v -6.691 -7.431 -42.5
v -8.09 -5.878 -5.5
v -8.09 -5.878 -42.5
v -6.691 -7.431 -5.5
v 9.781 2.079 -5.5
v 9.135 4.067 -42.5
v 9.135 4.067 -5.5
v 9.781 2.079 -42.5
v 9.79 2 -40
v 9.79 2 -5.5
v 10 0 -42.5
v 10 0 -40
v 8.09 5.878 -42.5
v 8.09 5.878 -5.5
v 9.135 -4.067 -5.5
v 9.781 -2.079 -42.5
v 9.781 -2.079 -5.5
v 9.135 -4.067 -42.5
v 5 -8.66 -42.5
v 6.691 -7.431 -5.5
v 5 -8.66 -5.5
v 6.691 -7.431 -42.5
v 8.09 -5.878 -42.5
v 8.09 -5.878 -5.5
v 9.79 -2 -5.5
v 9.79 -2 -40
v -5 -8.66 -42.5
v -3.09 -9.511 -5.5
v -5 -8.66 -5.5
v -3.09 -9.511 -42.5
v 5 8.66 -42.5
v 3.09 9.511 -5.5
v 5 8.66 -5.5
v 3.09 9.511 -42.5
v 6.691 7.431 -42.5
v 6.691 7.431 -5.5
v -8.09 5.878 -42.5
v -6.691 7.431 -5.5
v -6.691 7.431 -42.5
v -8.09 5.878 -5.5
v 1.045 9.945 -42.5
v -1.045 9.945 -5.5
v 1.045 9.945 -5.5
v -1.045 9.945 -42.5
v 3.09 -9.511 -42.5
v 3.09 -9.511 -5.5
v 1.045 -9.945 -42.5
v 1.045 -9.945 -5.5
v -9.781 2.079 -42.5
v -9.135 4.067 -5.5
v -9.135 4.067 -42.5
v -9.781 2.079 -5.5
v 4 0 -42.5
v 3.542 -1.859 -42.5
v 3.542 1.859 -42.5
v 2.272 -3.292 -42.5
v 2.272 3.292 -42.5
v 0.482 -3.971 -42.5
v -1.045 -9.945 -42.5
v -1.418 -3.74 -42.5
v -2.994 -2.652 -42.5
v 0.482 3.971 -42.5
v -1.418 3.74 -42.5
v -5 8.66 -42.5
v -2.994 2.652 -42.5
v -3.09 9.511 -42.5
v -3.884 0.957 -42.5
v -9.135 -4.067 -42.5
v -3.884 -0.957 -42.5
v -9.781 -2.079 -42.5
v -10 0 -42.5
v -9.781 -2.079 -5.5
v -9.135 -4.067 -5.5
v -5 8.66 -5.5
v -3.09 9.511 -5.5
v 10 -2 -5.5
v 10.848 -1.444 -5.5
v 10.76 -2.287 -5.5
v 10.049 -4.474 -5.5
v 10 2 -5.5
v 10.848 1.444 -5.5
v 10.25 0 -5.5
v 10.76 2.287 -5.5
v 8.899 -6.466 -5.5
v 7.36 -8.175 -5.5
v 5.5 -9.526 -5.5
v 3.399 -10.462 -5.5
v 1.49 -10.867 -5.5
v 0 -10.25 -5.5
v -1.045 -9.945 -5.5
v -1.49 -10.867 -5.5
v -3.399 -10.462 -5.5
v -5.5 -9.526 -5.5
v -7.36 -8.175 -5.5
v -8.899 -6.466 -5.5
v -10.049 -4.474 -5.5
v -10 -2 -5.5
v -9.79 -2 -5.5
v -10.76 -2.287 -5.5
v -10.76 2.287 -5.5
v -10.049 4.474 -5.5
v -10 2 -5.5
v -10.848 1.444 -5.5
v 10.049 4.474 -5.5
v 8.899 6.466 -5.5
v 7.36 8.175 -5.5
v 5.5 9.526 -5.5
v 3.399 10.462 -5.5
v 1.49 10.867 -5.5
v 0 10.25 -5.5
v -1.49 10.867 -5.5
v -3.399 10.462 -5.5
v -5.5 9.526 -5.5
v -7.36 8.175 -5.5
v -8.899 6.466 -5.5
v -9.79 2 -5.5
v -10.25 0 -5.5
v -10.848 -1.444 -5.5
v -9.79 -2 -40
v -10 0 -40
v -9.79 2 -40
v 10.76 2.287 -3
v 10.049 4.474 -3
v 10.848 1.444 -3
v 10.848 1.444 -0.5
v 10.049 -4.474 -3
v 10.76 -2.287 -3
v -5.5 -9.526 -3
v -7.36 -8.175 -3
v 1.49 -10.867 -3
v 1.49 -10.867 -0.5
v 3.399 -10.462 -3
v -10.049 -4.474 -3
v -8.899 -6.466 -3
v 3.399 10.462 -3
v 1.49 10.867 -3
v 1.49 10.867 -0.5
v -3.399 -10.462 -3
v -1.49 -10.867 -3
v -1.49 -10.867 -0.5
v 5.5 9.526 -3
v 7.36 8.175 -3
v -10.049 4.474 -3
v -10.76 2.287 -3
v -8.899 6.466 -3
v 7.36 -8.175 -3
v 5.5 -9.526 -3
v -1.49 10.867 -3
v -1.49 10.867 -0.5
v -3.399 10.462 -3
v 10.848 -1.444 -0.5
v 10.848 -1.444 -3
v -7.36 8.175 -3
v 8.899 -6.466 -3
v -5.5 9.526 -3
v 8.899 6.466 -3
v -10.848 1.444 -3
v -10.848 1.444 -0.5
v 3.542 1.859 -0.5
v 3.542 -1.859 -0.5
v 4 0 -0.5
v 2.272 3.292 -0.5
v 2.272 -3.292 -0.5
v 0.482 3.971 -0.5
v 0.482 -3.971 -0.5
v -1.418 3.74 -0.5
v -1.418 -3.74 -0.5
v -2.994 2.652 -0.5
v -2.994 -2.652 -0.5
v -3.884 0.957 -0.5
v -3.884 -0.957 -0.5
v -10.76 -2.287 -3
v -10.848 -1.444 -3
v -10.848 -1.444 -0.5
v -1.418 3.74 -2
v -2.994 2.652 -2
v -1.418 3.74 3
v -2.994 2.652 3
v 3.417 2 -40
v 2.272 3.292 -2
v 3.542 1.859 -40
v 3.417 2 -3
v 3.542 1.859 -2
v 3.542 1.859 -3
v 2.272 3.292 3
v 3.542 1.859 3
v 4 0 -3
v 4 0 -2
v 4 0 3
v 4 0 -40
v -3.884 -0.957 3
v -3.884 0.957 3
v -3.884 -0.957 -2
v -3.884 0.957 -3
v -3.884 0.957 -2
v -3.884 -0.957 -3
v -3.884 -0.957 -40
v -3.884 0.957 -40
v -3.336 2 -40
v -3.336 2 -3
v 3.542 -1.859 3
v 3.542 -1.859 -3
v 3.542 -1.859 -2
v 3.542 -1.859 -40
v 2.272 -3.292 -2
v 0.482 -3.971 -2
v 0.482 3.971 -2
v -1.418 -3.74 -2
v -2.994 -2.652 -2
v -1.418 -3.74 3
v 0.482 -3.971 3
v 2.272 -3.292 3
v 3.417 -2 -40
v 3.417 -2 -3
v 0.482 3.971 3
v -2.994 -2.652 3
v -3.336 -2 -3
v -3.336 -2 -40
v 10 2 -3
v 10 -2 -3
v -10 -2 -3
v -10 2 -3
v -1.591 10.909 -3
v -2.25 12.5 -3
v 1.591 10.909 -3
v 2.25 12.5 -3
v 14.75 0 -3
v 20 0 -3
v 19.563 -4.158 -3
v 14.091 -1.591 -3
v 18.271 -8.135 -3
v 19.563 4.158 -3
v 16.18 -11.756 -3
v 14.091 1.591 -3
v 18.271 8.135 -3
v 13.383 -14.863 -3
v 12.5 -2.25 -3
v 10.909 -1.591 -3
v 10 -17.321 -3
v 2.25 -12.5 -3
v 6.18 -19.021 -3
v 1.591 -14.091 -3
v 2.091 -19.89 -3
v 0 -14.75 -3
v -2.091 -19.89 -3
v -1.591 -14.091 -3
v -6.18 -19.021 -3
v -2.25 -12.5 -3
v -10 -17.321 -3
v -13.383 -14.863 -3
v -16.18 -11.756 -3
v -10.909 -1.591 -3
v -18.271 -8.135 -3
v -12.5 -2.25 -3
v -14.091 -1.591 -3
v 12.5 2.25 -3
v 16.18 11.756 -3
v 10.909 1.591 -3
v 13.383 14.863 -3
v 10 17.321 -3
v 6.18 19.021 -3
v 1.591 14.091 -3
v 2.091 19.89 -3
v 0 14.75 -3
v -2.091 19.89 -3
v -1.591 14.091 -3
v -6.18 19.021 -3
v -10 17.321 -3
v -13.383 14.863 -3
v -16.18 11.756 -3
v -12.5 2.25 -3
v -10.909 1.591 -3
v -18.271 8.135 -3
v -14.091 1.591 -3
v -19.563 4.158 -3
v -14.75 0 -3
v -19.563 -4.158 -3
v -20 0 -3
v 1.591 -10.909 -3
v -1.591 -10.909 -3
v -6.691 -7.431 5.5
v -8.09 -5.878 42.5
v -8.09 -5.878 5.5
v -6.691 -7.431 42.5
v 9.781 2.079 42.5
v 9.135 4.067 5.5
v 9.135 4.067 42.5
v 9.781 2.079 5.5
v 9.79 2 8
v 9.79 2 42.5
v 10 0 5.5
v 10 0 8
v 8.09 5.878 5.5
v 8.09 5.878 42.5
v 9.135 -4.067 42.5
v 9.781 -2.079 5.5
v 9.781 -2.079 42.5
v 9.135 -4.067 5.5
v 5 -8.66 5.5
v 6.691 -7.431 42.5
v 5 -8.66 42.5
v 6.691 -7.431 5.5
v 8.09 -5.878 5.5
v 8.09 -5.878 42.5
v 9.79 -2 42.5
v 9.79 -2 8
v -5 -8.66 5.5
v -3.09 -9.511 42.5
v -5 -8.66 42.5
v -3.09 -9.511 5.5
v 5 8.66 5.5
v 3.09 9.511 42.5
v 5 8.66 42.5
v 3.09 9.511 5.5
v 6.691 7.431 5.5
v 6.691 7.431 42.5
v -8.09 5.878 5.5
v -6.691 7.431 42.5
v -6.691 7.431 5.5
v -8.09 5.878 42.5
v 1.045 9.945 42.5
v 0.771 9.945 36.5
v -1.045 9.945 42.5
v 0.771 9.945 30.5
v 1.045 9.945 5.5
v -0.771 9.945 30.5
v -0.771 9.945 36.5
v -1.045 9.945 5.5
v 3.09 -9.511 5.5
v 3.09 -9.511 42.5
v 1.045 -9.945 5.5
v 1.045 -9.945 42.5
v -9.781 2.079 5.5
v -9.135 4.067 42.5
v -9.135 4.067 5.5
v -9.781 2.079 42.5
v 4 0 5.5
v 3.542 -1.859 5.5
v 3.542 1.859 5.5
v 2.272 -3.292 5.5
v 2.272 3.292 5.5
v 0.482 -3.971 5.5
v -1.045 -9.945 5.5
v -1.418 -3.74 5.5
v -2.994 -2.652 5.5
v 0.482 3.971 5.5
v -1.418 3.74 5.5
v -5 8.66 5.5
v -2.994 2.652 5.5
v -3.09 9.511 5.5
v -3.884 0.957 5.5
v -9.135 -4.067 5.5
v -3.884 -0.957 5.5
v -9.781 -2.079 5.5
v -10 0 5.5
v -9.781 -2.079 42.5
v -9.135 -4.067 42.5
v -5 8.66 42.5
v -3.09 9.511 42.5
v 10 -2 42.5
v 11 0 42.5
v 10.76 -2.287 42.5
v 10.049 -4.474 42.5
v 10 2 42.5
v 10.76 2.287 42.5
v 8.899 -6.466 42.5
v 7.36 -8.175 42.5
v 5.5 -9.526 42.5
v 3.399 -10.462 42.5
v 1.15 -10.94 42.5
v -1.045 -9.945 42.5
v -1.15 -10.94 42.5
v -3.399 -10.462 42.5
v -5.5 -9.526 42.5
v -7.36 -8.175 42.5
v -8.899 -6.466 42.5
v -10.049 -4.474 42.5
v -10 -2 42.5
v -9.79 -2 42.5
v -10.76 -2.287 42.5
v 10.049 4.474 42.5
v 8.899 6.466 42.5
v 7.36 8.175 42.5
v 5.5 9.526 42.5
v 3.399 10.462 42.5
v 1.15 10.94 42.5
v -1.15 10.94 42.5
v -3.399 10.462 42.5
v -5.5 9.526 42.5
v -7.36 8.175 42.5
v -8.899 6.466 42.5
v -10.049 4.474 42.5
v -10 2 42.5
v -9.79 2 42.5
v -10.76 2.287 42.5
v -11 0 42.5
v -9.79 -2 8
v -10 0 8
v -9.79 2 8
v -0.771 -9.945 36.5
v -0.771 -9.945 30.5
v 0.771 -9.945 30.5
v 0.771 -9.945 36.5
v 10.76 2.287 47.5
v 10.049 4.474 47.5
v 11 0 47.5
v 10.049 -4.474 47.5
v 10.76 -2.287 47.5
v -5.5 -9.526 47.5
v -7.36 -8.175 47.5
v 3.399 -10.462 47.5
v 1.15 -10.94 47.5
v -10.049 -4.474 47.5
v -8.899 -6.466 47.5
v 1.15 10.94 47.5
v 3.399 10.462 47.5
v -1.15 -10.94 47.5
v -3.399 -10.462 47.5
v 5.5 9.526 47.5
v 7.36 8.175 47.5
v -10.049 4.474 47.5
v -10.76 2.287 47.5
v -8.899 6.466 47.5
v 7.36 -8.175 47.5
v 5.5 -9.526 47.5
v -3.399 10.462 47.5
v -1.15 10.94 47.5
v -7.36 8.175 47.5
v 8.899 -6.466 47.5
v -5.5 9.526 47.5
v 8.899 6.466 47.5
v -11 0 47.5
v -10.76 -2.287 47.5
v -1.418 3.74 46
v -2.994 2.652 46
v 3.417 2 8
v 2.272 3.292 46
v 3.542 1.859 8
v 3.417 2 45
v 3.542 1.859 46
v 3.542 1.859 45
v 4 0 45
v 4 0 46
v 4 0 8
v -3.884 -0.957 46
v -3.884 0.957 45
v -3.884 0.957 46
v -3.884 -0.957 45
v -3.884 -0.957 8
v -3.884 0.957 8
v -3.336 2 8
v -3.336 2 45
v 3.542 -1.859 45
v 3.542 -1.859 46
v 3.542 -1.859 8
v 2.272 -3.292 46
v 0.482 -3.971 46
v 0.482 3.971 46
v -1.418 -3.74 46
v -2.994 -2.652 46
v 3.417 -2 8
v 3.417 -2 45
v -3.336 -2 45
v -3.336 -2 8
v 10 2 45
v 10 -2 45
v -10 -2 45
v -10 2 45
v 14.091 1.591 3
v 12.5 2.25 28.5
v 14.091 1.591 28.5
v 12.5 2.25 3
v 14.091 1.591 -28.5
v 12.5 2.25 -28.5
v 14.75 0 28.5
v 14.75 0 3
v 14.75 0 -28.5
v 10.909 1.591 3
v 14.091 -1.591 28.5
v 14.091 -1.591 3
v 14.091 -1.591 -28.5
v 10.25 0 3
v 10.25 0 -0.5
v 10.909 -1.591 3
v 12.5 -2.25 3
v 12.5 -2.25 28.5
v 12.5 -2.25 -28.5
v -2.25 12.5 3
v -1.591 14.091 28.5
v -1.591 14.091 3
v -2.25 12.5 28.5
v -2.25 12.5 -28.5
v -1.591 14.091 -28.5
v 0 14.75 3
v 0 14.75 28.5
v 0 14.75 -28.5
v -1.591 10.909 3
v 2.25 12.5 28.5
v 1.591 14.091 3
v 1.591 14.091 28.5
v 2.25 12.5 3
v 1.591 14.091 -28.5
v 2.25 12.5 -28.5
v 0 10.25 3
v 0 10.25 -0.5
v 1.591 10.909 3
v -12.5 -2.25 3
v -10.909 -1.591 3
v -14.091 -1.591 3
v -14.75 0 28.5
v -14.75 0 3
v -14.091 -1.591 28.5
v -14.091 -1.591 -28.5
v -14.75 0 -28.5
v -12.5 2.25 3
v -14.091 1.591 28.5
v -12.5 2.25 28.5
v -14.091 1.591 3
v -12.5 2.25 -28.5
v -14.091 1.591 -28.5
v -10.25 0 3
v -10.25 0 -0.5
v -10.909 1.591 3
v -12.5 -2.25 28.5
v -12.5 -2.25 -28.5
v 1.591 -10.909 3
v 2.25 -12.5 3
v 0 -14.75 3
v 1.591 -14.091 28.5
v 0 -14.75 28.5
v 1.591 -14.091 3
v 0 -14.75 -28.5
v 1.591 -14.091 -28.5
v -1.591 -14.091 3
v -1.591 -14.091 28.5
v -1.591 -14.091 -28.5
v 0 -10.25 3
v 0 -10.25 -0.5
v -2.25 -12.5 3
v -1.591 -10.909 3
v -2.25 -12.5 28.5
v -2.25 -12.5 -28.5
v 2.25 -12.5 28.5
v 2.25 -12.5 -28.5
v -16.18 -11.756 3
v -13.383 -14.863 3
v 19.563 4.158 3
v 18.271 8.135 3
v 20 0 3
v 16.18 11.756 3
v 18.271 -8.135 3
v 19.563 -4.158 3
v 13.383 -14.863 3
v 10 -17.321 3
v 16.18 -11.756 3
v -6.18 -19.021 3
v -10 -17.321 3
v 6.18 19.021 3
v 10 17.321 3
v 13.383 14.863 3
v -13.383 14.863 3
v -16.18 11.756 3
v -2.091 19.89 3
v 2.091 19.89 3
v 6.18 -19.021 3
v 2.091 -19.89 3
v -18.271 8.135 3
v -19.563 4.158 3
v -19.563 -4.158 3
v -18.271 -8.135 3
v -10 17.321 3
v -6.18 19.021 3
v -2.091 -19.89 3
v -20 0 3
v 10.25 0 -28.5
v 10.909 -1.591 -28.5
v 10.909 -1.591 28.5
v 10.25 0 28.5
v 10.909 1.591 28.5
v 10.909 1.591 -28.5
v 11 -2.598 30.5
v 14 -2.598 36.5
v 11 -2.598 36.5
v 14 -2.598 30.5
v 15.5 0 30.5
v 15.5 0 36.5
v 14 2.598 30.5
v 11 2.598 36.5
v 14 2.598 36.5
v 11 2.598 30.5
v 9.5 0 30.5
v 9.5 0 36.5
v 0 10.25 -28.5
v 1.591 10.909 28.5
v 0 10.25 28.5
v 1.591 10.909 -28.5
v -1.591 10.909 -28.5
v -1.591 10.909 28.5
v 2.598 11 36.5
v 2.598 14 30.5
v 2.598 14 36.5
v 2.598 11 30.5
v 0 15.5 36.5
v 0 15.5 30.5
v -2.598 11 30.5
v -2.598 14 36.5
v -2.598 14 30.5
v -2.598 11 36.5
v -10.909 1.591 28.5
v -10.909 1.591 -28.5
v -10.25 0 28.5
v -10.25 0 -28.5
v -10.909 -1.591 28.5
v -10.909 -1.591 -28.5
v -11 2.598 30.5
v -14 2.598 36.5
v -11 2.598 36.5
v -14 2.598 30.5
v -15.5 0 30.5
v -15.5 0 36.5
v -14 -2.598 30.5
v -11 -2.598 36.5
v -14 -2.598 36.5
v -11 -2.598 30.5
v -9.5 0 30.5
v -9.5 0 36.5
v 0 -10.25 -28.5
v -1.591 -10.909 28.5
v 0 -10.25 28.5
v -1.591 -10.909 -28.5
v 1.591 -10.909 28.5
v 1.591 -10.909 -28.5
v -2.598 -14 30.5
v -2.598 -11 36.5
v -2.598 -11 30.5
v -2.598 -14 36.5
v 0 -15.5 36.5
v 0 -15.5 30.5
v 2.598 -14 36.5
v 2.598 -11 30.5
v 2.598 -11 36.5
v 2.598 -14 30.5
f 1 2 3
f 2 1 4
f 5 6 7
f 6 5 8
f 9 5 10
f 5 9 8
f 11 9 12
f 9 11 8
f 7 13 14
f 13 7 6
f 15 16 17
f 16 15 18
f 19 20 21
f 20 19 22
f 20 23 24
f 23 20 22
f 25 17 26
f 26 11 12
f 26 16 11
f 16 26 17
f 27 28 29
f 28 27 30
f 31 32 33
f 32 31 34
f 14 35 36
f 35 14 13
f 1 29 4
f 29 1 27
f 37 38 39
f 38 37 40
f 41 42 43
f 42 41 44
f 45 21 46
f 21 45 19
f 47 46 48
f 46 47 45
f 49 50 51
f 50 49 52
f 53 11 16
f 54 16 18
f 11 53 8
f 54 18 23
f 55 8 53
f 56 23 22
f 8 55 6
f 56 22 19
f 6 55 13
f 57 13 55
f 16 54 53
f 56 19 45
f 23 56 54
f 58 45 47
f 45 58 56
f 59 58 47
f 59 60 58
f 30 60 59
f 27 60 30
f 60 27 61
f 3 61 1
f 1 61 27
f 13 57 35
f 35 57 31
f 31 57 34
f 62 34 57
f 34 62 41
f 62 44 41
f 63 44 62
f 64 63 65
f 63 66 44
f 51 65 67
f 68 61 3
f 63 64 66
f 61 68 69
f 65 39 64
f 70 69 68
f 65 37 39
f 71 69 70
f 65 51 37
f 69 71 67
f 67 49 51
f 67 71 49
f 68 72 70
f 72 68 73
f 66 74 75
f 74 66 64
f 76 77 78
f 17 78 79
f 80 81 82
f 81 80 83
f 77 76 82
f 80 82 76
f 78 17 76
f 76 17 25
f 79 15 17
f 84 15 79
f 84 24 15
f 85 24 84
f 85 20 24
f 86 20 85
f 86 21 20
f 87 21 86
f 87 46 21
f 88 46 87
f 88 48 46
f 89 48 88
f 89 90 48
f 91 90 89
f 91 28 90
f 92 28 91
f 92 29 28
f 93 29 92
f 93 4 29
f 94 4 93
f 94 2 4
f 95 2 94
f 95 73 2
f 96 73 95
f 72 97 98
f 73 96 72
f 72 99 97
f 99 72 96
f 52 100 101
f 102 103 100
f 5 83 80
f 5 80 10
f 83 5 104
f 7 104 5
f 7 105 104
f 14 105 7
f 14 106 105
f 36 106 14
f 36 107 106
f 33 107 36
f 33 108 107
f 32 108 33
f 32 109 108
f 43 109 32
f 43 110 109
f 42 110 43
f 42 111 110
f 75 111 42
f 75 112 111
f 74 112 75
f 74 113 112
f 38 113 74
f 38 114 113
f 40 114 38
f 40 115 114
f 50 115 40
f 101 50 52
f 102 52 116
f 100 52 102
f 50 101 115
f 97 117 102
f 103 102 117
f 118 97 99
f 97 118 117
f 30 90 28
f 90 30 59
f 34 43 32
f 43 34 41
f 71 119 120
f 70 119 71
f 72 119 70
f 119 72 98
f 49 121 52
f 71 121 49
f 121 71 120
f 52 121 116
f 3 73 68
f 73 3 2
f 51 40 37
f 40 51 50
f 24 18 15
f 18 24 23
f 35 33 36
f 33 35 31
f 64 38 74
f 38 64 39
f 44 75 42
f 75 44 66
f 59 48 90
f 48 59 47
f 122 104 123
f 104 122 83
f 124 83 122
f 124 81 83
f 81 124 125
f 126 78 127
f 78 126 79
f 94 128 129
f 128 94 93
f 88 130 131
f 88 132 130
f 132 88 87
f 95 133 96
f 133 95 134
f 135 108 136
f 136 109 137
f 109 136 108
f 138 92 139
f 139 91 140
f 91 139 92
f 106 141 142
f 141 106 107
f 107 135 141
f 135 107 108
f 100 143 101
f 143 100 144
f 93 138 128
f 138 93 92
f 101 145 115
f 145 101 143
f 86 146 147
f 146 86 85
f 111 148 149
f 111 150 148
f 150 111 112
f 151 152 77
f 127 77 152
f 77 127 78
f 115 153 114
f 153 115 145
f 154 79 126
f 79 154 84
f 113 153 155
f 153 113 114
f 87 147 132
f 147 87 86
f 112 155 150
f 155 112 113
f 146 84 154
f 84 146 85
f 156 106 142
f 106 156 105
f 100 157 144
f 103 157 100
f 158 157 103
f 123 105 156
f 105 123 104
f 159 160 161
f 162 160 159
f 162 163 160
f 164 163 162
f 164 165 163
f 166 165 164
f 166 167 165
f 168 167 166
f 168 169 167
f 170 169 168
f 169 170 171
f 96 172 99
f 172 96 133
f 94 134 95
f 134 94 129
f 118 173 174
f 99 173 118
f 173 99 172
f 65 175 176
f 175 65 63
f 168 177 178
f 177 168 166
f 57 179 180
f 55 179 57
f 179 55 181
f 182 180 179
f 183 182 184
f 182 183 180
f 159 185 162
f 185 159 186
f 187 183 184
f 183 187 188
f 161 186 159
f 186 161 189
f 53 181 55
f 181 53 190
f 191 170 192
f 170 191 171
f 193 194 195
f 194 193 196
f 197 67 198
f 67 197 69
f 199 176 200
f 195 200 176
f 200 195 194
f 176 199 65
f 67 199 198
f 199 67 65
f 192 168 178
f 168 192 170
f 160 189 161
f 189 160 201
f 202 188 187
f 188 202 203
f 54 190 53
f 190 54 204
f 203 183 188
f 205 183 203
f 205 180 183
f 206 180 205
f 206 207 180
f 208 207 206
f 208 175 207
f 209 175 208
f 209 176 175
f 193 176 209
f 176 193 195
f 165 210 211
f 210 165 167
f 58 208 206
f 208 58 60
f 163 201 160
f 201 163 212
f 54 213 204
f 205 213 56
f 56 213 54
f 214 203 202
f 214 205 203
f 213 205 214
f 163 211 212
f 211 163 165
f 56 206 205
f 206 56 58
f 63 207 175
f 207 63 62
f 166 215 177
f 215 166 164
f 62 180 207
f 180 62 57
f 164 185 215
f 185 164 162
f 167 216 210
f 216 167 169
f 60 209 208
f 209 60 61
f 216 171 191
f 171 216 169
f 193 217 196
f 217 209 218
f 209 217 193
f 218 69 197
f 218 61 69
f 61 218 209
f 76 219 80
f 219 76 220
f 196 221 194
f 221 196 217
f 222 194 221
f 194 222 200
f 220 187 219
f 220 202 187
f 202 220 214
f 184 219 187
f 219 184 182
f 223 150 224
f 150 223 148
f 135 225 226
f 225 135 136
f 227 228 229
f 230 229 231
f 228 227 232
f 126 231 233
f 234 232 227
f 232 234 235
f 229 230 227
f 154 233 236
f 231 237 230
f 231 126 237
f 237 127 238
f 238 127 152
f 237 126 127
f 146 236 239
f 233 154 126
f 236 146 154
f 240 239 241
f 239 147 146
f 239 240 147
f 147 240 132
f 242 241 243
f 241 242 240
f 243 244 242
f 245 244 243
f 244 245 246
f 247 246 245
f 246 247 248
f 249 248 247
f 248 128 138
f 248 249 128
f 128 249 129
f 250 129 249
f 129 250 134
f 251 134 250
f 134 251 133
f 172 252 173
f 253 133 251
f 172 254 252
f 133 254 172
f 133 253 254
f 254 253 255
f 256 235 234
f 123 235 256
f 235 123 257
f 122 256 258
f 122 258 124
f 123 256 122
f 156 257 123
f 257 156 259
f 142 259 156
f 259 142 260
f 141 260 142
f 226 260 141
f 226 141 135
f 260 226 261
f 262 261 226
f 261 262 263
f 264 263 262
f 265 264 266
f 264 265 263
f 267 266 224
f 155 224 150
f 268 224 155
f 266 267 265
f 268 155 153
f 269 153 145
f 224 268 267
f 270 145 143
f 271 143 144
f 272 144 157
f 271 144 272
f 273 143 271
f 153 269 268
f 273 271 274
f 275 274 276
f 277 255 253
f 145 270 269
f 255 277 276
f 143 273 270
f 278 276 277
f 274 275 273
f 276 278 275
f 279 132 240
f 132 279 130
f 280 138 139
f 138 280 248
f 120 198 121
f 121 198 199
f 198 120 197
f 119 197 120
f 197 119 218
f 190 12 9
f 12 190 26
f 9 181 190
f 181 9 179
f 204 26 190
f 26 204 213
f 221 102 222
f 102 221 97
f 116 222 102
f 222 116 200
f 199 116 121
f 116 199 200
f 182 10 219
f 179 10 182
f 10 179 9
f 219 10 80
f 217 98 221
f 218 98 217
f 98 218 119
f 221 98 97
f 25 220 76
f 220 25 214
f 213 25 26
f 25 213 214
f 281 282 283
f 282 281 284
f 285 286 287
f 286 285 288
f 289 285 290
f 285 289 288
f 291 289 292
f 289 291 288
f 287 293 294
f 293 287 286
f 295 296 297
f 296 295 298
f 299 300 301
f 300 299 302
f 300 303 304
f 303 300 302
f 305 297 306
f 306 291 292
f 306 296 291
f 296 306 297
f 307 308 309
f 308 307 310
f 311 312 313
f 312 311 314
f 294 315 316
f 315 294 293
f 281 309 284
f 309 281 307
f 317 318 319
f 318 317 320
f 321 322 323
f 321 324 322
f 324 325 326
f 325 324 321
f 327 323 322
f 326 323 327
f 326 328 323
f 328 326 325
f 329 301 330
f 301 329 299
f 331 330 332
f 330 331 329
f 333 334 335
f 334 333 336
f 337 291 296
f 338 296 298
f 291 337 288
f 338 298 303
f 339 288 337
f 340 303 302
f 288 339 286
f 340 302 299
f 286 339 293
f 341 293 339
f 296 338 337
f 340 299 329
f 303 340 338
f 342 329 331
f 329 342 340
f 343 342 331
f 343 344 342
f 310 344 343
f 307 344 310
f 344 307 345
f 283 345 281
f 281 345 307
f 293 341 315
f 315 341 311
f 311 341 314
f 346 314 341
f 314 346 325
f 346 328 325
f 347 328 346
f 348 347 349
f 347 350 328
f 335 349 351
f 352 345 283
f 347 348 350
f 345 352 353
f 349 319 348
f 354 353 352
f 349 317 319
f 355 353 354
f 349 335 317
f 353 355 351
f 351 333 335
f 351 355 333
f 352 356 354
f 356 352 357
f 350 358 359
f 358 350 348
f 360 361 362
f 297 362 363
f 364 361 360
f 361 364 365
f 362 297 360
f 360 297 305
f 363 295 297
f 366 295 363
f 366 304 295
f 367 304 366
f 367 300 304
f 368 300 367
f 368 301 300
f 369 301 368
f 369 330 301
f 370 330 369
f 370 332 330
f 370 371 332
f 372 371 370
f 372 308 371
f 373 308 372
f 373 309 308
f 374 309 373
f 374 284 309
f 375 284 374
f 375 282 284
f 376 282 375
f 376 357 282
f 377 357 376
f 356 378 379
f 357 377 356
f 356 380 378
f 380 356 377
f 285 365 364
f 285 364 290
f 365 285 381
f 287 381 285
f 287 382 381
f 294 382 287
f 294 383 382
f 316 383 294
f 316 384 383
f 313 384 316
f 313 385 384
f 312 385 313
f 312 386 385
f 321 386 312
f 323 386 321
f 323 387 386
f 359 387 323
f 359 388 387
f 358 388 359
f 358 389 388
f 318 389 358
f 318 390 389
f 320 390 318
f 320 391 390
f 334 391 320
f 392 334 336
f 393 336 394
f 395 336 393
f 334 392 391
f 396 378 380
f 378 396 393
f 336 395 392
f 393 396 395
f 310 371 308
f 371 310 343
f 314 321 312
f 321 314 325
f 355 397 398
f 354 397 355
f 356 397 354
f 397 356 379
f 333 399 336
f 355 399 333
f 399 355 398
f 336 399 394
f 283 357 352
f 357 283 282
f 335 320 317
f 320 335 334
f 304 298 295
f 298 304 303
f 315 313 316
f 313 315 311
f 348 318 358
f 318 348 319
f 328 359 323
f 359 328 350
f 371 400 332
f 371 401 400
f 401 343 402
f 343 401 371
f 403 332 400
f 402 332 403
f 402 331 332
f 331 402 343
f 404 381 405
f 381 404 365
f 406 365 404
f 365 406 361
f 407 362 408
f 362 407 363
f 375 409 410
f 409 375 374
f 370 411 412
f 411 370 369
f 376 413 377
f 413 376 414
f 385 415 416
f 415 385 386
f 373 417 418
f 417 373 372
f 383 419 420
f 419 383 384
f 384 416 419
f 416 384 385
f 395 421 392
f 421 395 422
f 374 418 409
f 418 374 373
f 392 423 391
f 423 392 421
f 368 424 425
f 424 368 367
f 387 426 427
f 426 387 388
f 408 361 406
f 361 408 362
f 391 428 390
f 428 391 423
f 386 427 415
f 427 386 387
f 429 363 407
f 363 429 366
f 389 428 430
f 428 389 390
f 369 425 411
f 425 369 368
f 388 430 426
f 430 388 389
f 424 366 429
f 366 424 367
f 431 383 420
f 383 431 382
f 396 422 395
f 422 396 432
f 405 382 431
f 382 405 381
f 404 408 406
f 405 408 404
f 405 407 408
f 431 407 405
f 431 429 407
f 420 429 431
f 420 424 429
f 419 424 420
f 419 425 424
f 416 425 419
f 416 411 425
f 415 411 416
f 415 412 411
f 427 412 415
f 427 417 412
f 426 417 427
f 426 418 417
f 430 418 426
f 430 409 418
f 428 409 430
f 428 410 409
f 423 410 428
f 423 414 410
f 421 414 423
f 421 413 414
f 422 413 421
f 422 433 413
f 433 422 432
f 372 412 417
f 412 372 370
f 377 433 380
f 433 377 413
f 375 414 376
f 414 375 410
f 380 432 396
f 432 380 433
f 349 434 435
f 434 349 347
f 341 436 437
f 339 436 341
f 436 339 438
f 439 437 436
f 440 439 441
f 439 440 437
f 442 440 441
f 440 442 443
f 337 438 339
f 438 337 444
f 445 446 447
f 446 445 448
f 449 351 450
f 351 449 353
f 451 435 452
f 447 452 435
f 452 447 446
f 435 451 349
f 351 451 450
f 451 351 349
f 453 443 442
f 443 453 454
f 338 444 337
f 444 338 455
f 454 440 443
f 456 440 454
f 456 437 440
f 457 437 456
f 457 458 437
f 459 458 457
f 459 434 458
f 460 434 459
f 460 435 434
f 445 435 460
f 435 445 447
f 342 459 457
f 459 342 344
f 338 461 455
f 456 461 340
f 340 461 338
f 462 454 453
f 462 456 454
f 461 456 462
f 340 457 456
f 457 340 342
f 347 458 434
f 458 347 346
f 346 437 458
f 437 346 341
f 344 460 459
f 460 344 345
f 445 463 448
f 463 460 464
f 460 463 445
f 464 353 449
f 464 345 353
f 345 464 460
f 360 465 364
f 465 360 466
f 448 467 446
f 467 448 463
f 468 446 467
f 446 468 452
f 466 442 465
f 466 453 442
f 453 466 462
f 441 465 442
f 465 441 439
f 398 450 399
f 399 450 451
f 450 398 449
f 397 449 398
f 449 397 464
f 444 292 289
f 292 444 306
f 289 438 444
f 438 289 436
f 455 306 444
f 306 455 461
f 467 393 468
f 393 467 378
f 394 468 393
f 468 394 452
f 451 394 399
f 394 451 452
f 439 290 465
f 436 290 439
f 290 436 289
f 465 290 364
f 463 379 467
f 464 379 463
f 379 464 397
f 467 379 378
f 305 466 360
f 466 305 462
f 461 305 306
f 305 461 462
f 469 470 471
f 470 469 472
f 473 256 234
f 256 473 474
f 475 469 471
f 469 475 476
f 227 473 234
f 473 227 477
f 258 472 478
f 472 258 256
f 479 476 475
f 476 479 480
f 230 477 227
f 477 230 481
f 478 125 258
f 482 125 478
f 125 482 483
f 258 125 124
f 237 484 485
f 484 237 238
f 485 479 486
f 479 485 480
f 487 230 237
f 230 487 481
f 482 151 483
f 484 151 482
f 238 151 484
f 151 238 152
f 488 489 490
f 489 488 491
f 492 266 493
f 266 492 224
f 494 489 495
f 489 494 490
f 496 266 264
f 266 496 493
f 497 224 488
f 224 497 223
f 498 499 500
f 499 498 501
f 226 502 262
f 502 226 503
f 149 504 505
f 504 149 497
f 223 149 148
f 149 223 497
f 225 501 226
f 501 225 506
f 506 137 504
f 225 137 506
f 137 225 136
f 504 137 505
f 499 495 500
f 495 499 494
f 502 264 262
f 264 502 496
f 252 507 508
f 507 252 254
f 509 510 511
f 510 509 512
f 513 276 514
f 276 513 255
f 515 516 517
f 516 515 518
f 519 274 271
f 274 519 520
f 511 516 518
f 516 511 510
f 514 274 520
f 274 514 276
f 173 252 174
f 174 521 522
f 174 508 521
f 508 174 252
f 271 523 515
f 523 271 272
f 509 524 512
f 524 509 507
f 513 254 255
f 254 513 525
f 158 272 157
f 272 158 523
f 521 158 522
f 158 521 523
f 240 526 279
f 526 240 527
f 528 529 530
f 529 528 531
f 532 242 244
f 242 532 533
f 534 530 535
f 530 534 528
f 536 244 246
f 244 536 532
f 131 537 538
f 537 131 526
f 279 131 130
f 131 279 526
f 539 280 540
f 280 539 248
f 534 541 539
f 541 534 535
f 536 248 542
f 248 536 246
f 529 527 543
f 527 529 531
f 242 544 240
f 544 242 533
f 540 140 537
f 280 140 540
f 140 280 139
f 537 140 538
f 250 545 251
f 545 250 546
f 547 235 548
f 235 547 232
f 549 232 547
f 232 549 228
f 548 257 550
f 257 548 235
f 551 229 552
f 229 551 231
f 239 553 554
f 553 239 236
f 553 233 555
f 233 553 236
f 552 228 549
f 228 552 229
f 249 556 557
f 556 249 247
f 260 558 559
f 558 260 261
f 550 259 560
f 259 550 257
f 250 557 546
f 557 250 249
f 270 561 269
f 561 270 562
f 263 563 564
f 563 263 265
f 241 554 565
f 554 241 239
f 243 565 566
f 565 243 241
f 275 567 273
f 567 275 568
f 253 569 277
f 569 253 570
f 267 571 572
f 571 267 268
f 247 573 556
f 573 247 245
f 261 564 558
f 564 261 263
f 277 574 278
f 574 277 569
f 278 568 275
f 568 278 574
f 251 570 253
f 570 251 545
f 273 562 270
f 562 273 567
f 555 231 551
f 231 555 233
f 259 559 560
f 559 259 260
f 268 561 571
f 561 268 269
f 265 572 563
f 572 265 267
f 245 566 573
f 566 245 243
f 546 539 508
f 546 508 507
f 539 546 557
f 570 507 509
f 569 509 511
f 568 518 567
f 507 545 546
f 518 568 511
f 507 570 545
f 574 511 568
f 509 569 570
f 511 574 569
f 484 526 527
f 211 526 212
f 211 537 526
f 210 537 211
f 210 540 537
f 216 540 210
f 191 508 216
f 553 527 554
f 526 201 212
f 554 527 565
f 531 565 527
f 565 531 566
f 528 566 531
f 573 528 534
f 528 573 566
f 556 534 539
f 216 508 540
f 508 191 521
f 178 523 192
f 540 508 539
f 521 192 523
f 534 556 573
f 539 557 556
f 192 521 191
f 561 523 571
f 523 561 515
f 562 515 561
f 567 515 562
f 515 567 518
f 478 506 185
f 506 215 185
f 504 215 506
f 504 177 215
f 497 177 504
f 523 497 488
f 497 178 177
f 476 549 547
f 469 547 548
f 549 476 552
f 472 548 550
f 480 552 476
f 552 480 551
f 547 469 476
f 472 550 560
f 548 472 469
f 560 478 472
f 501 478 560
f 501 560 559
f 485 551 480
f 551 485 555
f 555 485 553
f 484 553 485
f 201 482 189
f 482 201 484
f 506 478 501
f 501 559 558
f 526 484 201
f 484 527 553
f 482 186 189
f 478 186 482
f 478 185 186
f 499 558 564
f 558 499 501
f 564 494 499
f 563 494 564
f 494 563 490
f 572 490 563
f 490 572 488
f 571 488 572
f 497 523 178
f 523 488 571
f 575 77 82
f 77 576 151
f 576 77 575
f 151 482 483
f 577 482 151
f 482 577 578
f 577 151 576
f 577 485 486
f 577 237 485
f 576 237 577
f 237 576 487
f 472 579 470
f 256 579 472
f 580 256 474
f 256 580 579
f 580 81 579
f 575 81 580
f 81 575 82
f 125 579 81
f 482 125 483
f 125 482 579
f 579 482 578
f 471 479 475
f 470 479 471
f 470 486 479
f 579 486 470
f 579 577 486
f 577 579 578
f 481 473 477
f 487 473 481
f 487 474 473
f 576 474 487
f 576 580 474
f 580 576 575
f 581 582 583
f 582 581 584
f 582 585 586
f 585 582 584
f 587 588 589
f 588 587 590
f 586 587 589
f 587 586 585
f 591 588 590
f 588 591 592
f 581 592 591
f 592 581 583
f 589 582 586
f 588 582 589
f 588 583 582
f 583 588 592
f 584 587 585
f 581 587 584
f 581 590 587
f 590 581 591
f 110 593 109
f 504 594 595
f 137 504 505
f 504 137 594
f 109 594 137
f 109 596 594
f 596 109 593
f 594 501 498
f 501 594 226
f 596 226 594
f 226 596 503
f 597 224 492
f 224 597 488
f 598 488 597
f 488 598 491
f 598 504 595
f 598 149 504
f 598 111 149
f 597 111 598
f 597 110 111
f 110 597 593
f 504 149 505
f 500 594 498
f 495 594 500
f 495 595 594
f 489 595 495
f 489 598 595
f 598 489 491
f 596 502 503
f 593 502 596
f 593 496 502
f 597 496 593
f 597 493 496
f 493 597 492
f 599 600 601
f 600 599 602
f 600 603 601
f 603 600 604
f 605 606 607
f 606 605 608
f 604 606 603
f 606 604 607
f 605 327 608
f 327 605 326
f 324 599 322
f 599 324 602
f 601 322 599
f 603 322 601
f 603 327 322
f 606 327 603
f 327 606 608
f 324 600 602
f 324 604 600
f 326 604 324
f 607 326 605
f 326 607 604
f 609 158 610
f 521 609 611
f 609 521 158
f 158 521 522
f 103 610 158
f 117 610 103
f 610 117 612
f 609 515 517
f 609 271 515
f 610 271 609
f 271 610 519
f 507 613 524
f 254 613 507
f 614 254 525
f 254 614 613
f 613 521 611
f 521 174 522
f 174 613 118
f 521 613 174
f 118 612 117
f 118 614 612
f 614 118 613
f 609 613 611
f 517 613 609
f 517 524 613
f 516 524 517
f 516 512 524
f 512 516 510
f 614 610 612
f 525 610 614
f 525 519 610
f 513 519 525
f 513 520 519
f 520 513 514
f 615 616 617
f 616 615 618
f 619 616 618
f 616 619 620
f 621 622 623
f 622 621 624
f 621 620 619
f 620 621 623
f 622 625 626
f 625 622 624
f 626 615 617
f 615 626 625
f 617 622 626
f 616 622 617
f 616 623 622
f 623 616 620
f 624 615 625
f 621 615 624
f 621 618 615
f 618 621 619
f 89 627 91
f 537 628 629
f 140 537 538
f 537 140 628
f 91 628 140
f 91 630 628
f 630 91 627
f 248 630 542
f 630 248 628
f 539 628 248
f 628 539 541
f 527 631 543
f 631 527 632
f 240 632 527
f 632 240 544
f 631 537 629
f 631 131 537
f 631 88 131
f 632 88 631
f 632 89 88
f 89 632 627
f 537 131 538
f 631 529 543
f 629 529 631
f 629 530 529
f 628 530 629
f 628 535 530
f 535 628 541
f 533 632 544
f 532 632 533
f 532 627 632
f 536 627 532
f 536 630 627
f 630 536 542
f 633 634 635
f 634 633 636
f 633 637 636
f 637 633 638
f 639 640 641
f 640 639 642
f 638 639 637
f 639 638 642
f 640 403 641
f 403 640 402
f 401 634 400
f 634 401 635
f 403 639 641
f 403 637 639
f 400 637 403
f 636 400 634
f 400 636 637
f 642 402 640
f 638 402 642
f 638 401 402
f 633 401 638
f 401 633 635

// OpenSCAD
//start

// Parameters
shaft_length = 42; 
shaft_diameter = 20; // Adjusted diameter to match original model
shaft_hole_diameter = 8;
shaft_mounting_diameter = 22; // Adjusted diameter for mounting surface
flange_diameter = 40;
flange_thickness = 3; // Reduced thickness to match original model
diaphragm_thickness = 2;
bolt_diameter = 4.5; 
bolt_length = 57; // Adjusted bolt length for proper protrusion
nut_size = 6; // Reduced nut size to match original model
bolt_spacing = 25;

// Function to create a shaft with keyway slots
module shaft() {
    difference() {
        union() {
            cylinder(h=shaft_length - 5, d=shaft_diameter, center=true);
            translate([0, 0, (shaft_length - 5) / 2])
                cylinder(h=5, d=shaft_mounting_diameter, center=false); // Adjusted mounting surface
        }
        cylinder(h=shaft_length+2, d=shaft_hole_diameter, center=true);
        
        // Adjusted keyway slots positioning
        translate([-shaft_diameter/2, -2, -shaft_length/2 + 5])
        cube([shaft_diameter, 4, shaft_length - 5]);
    }
}

// Function to create a flange plate
module flange_plate() {
    difference() {
        cylinder(h=flange_thickness, d=flange_diameter, center=true);
        cylinder(h=flange_thickness+2, d=shaft_hole_diameter, center=true);
        for (i = [0:3]) {
            rotate([0, 0, i * 90])
                translate([bolt_spacing/2, 0, 0])
                cylinder(h=flange_thickness+2, d=bolt_diameter, center=true);
        }
    }
}

// Function to create the diaphragm
module diaphragm() {
    difference() {
        translate([0, 0, -diaphragm_thickness/2])
        cylinder(h=diaphragm_thickness, d=flange_diameter, center=true);
        cylinder(h=diaphragm_thickness+2, d=shaft_hole_diameter, center=true);
        for (i = [0:3]) {
            rotate([0, 0, i * 90])
                translate([bolt_spacing/2, 0, 0])
                cylinder(h=diaphragm_thickness+2, d=bolt_diameter, center=true);
        }
    }
}

// Function to create a bolt
module bolt() {
    translate([0, 0, -bolt_length/2])
    cylinder(h=bolt_length, d=bolt_diameter, center=false);
}

// Function to create a nut
module nut() {
    cylinder(h=nut_size, d=nut_size, $fn=6);
}

// Assembly of the coupling
module coupling() {
    // Left Shaft
    translate([0, 0, -shaft_length/2 - flange_thickness])
    shaft();
    
    // Right Shaft
    translate([0, 0, shaft_length/2 + flange_thickness])
    shaft();
    
    // Left Flange Plate
    translate([0, 0, -flange_thickness/2])
    flange_plate();
    
    // Right Flange Plate
    translate([0, 0, flange_thickness/2])
    flange_plate();
    
    // Diaphragm - Adjusted for better alignment
    translate([0, 0, 0])
    diaphragm();
    
    // Bolts and Nuts - Adjusted positioning
    for (i = [0:3]) {
        rotate([0, 0, i * 90])
            translate([bolt_spacing/2, 0, 0]) {
                bolt();
                translate([0, 0, bolt_length/2 + 2]) // Adjusted nut position for proper fastening
                nut();
            }
    }
}

// Render the coupling
coupling();
